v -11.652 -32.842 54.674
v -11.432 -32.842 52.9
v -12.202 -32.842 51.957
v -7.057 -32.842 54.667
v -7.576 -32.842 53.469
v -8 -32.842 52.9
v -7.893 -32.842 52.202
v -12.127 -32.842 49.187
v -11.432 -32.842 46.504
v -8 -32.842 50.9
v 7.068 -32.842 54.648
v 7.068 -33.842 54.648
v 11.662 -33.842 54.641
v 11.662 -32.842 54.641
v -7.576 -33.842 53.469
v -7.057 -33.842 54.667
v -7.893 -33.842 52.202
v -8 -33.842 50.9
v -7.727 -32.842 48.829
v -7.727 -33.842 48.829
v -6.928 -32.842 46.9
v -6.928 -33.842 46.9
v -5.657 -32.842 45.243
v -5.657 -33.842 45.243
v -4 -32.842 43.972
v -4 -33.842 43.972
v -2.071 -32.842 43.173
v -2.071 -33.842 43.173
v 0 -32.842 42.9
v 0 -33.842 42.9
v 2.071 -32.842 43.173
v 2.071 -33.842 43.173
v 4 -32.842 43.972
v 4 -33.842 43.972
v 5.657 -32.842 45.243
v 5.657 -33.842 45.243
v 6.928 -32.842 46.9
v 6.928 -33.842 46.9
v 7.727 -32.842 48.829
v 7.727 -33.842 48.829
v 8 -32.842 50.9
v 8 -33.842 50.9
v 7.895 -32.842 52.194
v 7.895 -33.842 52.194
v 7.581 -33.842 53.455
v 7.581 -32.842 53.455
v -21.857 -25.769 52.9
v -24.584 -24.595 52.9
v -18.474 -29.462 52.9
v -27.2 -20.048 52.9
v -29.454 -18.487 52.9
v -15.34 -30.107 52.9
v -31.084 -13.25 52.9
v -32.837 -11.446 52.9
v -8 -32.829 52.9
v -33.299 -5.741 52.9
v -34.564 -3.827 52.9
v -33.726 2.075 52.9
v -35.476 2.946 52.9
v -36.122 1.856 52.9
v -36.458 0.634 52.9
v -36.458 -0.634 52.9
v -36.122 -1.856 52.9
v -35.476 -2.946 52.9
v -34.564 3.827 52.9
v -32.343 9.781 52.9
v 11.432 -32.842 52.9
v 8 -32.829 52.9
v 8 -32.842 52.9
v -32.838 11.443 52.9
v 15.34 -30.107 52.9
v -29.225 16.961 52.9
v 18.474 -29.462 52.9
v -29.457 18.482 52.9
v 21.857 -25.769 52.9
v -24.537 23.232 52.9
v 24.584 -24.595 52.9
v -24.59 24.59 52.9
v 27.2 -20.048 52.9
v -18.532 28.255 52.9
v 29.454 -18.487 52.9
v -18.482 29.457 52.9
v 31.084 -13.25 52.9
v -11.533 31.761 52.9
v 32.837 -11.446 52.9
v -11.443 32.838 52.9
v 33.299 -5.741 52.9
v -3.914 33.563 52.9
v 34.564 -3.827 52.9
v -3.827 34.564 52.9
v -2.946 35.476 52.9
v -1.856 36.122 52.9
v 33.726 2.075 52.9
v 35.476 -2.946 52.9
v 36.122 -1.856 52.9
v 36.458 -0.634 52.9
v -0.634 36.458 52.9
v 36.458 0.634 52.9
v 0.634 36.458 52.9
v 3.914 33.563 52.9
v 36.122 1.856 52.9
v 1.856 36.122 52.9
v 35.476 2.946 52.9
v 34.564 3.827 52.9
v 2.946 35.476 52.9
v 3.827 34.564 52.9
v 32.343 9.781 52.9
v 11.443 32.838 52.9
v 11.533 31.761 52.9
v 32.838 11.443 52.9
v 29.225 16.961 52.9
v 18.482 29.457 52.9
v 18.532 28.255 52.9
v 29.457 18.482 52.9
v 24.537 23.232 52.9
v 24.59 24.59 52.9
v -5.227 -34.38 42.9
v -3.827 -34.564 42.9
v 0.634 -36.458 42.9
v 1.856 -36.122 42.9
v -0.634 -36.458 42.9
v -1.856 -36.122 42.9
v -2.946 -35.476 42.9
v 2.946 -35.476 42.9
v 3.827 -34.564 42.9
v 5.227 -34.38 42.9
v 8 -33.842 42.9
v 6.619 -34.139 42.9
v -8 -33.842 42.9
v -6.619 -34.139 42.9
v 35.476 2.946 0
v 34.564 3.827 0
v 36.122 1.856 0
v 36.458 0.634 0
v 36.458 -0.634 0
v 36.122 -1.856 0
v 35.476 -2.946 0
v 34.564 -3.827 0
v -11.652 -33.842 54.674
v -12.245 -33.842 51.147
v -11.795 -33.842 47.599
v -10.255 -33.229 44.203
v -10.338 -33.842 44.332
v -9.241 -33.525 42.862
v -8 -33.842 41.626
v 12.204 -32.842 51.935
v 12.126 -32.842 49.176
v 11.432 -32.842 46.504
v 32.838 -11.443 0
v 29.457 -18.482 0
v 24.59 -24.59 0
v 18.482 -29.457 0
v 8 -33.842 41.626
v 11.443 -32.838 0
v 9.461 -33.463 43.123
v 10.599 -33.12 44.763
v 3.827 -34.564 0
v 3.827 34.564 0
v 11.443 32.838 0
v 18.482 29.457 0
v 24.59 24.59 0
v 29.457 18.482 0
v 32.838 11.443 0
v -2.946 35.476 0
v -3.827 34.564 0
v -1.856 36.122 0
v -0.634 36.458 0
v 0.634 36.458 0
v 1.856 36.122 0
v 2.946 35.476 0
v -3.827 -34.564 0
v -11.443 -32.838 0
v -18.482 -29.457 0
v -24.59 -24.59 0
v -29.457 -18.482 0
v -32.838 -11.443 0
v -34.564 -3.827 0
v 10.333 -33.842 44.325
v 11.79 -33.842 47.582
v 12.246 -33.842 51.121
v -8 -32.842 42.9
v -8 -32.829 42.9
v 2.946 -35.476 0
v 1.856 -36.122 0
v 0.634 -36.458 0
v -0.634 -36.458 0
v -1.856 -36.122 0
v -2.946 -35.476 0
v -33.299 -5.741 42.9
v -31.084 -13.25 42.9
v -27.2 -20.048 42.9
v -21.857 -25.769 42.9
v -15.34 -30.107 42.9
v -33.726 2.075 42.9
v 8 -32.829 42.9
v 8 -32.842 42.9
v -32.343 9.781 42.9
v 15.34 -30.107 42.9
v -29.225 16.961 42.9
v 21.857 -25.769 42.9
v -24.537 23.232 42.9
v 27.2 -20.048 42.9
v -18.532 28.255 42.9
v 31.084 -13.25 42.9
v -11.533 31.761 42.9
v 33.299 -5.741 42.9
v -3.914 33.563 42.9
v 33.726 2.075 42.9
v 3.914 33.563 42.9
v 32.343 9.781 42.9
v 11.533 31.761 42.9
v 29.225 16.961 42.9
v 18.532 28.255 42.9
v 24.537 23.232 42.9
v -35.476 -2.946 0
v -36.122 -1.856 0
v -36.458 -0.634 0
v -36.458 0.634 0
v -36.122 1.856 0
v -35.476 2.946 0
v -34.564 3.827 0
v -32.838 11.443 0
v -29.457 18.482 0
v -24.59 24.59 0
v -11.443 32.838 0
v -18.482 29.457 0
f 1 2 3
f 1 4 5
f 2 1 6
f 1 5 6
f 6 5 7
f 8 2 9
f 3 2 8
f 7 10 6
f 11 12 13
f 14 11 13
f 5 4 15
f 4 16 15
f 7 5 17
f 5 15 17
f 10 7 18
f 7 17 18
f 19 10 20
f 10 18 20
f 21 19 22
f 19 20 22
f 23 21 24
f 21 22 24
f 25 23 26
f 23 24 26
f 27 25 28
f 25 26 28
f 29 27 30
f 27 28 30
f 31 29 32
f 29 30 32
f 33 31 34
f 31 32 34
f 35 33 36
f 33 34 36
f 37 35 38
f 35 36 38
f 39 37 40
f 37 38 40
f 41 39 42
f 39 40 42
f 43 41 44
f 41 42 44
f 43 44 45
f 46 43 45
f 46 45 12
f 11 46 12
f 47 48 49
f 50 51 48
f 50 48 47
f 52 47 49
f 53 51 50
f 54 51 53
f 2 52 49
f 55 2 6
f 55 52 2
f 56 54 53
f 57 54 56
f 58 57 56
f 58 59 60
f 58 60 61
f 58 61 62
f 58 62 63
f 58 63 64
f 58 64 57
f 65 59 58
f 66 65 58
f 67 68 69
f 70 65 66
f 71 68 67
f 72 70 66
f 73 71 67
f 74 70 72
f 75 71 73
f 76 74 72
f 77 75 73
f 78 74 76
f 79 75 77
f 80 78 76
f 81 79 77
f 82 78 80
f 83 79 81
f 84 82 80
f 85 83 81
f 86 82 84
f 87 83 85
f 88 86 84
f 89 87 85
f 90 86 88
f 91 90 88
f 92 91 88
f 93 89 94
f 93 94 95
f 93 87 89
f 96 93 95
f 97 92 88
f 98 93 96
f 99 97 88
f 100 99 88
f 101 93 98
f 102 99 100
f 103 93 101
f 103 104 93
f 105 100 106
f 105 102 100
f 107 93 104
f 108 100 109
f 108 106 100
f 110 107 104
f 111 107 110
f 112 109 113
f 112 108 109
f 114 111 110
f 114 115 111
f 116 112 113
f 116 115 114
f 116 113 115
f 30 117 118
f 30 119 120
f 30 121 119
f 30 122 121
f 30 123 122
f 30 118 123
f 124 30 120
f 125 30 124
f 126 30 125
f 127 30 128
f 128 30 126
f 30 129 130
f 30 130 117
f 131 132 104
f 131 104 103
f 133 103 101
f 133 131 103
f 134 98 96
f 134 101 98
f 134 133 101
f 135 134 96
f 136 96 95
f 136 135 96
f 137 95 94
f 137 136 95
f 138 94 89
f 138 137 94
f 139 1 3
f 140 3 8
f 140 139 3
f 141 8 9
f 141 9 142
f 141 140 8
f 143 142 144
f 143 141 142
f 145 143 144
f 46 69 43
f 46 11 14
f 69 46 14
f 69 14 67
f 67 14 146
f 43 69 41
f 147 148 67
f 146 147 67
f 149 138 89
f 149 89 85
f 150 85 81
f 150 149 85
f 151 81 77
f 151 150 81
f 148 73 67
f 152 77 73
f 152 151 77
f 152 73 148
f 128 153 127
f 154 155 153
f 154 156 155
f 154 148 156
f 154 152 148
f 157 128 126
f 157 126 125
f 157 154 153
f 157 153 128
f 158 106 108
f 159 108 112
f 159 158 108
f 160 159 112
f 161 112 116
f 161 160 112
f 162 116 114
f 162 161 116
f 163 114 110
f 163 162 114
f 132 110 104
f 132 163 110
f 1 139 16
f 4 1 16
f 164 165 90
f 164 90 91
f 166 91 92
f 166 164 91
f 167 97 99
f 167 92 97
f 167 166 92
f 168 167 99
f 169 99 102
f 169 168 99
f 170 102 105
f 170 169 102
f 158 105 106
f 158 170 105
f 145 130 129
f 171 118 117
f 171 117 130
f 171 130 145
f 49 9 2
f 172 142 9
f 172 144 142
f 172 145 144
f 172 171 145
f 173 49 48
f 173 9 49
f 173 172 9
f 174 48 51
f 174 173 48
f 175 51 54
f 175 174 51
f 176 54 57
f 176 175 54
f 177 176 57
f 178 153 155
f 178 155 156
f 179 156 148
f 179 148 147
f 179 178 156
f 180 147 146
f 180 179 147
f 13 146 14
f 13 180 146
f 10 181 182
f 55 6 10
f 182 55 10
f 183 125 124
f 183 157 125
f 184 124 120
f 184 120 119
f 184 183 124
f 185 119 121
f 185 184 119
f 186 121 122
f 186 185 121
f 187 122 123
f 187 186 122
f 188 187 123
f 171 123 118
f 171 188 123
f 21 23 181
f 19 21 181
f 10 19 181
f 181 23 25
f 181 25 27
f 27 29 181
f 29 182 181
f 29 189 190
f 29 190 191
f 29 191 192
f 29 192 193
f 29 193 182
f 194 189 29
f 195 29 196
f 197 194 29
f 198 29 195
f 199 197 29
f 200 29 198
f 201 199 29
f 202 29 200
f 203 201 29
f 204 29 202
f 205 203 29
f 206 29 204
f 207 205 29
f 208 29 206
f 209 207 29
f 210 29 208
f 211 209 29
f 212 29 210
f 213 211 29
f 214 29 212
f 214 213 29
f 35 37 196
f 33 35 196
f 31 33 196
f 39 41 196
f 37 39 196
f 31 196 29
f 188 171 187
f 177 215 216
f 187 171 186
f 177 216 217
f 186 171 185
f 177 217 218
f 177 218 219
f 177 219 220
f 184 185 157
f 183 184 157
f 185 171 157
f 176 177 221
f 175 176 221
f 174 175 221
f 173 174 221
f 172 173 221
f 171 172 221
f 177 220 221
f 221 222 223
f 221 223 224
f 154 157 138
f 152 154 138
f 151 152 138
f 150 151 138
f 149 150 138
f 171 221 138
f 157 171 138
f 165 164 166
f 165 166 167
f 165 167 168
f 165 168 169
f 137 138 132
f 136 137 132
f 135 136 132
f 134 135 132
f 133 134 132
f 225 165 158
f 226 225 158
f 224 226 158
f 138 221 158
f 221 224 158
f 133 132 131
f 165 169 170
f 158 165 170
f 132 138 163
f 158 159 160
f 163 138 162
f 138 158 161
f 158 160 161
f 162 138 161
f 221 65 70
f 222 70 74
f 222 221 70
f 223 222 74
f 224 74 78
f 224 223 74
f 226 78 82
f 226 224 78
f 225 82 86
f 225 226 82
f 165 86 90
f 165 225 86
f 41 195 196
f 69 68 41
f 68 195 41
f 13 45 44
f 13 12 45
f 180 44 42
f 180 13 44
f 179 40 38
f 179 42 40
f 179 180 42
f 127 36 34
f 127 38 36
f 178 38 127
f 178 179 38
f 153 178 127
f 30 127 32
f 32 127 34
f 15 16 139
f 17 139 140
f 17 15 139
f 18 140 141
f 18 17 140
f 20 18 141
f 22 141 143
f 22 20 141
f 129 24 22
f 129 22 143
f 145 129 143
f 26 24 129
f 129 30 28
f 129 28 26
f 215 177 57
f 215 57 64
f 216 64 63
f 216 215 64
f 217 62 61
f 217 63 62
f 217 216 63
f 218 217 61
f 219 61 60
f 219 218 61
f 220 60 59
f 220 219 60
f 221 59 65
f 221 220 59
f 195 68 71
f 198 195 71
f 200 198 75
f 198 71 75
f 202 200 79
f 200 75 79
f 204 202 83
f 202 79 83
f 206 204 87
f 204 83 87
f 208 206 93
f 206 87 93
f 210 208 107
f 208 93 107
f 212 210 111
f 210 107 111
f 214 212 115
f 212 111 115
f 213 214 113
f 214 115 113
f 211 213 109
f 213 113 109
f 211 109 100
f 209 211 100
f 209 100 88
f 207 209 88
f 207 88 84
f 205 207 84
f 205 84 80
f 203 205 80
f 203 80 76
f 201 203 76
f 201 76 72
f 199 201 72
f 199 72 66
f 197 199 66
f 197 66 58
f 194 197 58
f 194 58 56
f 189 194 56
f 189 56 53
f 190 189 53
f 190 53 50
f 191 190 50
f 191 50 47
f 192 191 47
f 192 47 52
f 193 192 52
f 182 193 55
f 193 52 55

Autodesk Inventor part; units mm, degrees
ref_plane "YZ Plane" through (0, 0, 0) normal (1, 0, 0) x (0, 1, 0)
ref_plane "XZ Plane" through (0, 0, 0) normal (0, 1, 0) x (-1, 0, 0)
ref_plane "XY Plane" through (0, 0, 0) normal (0, 0, 1) x (1, 0, 0)
sketch "Sketch1" plane through (0, 0, 0) normal (0, 0, 1) x (1, 0, 0)
  circle A0 centre (0, 0) radius 11.25
  circle A1 centre (0, 0) radius 35.025
  circle A2 centre (0, 0) radius 37.030393
  arc A3 (-32.79294, -17.200962) -> (-31.29294, -19.799038) centre (0, 0) ccw
  line L0 (-32.79294, -17.200962) -> (-31.05471, -16.197395)
  line L1 (-32.79294, -17.200962) -> (-31.05471, -16.197395)
  line L2 (-29.55471, -18.795471) -> (-31.29294, -19.799038)
  line L3 (-31.29294, -19.799038) -> (-29.55471, -18.795471)
  line L4 (-16.197395, -31.05471) -> (-17.200962, -32.79294)
  line L5 (-17.200962, -32.79294) -> (-16.197395, -31.05471)
  arc A4 (-19.799038, -31.29294) -> (-17.200962, -32.79294) centre (0, 0) ccw
  line L6 (-19.799038, -31.29294) -> (-18.795471, -29.55471)
  line L7 (-19.799038, -31.29294) -> (-18.795471, -29.55471)
  arc A5 (17.200962, -32.79294) -> (19.799038, -31.29294) centre (0, 0) ccw
  line L8 (17.200962, -32.79294) -> (16.197395, -31.05471)
  line L9 (17.200962, -32.79294) -> (16.197395, -31.05471)
  line L10 (18.795471, -29.55471) -> (19.799038, -31.29294)
  line L11 (19.799038, -31.29294) -> (18.795471, -29.55471)
  arc A6 (31.29294, -19.799038) -> (32.79294, -17.200962) centre (0, 0) ccw
  line L12 (31.29294, -19.799038) -> (29.55471, -18.795471)
  line L13 (31.05471, -16.197395) -> (32.79294, -17.200962)
  line L14 (32.79294, -17.200962) -> (31.05471, -16.197395)
  line L15 (32.79294, 17.200962) -> (31.05471, 16.197395)
  line L16 (32.79294, 17.200962) -> (31.05471, 16.197395)
  arc A7 (32.79294, 17.200962) -> (31.29294, 19.799038) centre (0, 0) ccw
  line L17 (29.55471, 18.795471) -> (31.29294, 19.799038)
  line L18 (31.29294, 19.799038) -> (29.55471, 18.795471)
  line L19 (16.197395, 31.05471) -> (17.200962, 32.79294)
  line L20 (17.200962, 32.79294) -> (16.197395, 31.05471)
  line L21 (19.799038, 31.29294) -> (18.795471, 29.55471)
  line L22 (19.799038, 31.29294) -> (18.795471, 29.55471)
  line L23 (-17.200962, 32.79294) -> (-16.197395, 31.05471)
  line L24 (-17.200962, 32.79294) -> (-16.197395, 31.05471)
  line L25 (-18.795471, 29.55471) -> (-19.799038, 31.29294)
  line L26 (-19.799038, 31.29294) -> (-18.795471, 29.55471)
  arc A8 (-31.29294, 19.799038) -> (-32.79294, 17.200962) centre (0, 0) ccw
  line L27 (-31.29294, 19.799038) -> (-29.55471, 18.795471)
  line L28 (-31.29294, 19.799038) -> (-29.55471, 18.795471)
  line L29 (-31.05471, 16.197395) -> (-32.79294, 17.200962)
  line L30 (-32.79294, 17.200962) -> (-31.05471, 16.197395)
  arc A9 (-34.800207, -3.961848) -> (-34.800207, 3.961848) centre (-31.75, 0) ccw
  circle A10 centre (-31.75, 0) radius 5
  arc A11 (-3.961848, 34.800207) -> (3.961848, 34.800207) centre (0, 31.75) ccw
  circle A12 centre (0, 31.75) radius 5
  circle A13 centre (31.75, 0) radius 5
  circle A14 centre (31.75, 0) radius 5
  arc A15 (-3.961848, -34.800207) -> (3.961848, -34.800207) centre (0, -31.75) ccw
  circle A16 centre (0, -31.75) radius 5
  circle A17 centre (0, 31.75) radius 4.75
  circle A18 centre (-31.75, 0) radius 4.75
  circle A19 centre (0, -31.75) radius 4.75
  circle A20 centre (31.75, 0) radius 4.75
  circle A21 centre (0, 0) radius 34.775
  circle A22 centre (0, 0) radius 36.75
  point P0 (0, 0)
  point P1 (0, 49.75)
  point P2 (34.563789, -3.82689)
  point P3 (34.563789, 3.82689)
  point P4 (3.82689, 34.563789)
  point P5 (-3.82689, 34.563789)
  point P6 (-34.563789, 3.82689)
  point P7 (-34.563789, -3.82689)
  point P8 (-3.82689, -34.563789)
  point P9 (3.82689, -34.563789)
  dimension "d6" = 70.05
  dimension "d8" = 74.06079
  dimension "d0" = 10
  dimension "d1" = 0.25
  dimension "d4" = 360
  dimension "d7" = 0.25
  dimension "d9" = 73.5
sketch "Sketch1 outline for Extrusion1" plane through (0, 0, 0) normal (0, 0, 1) x (1, 0, 0)
  arc A0 (3.82689, -34.563789) -> (34.563789, -3.82689) centre (0, 0) ccw
  arc A1 (-3.82689, -34.563789) -> (3.82689, -34.563789) centre (0, -31.75) ccw
  arc A2 (-34.563789, -3.82689) -> (-3.82689, -34.563789) centre (0, 0) ccw
  arc A3 (-34.563789, 3.82689) -> (-34.563789, -3.82689) centre (-31.75, 0) ccw
  arc A4 (-3.82689, 34.563789) -> (-34.563789, 3.82689) centre (0, 0) ccw
  arc A5 (3.82689, 34.563789) -> (-3.82689, 34.563789) centre (0, 31.75) ccw
  arc A6 (34.563789, 3.82689) -> (3.82689, 34.563789) centre (0, 0) ccw
  arc A7 (34.563789, -3.82689) -> (34.563789, 3.82689) centre (31.75, 0) ccw
extrude "Extrusion1" add sketch "Sketch1 outline for Extrusion1" along normal blind 52.9
sketch "Skizze4" plane through (0, 0, 52.9) normal (0, 0, 1) x (1, 0, 0)
  circle A0 centre (0, 0) radius 33.79
  dimension "d24" = 67.58
extrude "Extrusion4" cut sketch "Skizze4" against normal blind 10
sketch "Skizze5" plane through (0, 0, 52.9) normal (0, 0, 1) x (1, 0, 0)
  line L0 (-8, -25.79) -> (8, -25.79)
  line L1 (8, -25.79) -> (8, -41.79)
  line L2 (8, -41.79) -> (-8, -41.79)
  line L3 (-8, -41.79) -> (-8, -25.79)
  circle A0 centre (0, 0) radius 33.79 projected
  line L4 (-8, -25.79) -> (8, -41.79) construction
  line L5 (8, -25.79) -> (-8, -41.79) construction
  point P0 (0, -33.79)
  dimension "d27" = 16
  dimension "d28" = 16
extrude "Extrusion5" cut sketch "Skizze5" against normal up to surface (10 mm away) contours L0 L1 A0 L3 | A0 L1 L2 L3 picked at (-0.896461, -28.420935)
ref_plane "Arbeitsebene1" through (-8, -33.84229, 52.9) normal (0, -1, 0) x (0, 0, -1)
sketch "Skizze8" plane through (-8, -33.84229, 52.9) normal (0, -1, 0) x (0, 0, -1)
  circle A0 centre (2, 8) radius 8
  circle A1 centre (2, 8) radius 12.247788
  line L0 (-1.778493, -7.044693) -> (-1.736571, 22.979568)
  line L1 (10, 0) -> (2, 0)
  line L2 (2, 0) -> (2, 8)
  line L3 (2, 8) -> (10, 8)
  line L4 (10, 8) -> (10, 0)
  point P0 (52.9, 8)
  point P1 (3.776106, -5.296677)
  point P2 (-1.741203, 19.662406)
  point P3 (-1.747618, 15.067911)
  point P4 (-1.76734, 0.942582)
  point P5 (-1.773756, -3.651913)
  dimension "d31" = 16
  dimension "d36" = 8
extrude "Extrusion6" add sketch "Skizze8" against normal blind 1 contours L1 L4 A0 L0 A1 | A0 L4 L1
properties part number "2024_08_26_Double_walled_beaker_recess_2,1cm"
